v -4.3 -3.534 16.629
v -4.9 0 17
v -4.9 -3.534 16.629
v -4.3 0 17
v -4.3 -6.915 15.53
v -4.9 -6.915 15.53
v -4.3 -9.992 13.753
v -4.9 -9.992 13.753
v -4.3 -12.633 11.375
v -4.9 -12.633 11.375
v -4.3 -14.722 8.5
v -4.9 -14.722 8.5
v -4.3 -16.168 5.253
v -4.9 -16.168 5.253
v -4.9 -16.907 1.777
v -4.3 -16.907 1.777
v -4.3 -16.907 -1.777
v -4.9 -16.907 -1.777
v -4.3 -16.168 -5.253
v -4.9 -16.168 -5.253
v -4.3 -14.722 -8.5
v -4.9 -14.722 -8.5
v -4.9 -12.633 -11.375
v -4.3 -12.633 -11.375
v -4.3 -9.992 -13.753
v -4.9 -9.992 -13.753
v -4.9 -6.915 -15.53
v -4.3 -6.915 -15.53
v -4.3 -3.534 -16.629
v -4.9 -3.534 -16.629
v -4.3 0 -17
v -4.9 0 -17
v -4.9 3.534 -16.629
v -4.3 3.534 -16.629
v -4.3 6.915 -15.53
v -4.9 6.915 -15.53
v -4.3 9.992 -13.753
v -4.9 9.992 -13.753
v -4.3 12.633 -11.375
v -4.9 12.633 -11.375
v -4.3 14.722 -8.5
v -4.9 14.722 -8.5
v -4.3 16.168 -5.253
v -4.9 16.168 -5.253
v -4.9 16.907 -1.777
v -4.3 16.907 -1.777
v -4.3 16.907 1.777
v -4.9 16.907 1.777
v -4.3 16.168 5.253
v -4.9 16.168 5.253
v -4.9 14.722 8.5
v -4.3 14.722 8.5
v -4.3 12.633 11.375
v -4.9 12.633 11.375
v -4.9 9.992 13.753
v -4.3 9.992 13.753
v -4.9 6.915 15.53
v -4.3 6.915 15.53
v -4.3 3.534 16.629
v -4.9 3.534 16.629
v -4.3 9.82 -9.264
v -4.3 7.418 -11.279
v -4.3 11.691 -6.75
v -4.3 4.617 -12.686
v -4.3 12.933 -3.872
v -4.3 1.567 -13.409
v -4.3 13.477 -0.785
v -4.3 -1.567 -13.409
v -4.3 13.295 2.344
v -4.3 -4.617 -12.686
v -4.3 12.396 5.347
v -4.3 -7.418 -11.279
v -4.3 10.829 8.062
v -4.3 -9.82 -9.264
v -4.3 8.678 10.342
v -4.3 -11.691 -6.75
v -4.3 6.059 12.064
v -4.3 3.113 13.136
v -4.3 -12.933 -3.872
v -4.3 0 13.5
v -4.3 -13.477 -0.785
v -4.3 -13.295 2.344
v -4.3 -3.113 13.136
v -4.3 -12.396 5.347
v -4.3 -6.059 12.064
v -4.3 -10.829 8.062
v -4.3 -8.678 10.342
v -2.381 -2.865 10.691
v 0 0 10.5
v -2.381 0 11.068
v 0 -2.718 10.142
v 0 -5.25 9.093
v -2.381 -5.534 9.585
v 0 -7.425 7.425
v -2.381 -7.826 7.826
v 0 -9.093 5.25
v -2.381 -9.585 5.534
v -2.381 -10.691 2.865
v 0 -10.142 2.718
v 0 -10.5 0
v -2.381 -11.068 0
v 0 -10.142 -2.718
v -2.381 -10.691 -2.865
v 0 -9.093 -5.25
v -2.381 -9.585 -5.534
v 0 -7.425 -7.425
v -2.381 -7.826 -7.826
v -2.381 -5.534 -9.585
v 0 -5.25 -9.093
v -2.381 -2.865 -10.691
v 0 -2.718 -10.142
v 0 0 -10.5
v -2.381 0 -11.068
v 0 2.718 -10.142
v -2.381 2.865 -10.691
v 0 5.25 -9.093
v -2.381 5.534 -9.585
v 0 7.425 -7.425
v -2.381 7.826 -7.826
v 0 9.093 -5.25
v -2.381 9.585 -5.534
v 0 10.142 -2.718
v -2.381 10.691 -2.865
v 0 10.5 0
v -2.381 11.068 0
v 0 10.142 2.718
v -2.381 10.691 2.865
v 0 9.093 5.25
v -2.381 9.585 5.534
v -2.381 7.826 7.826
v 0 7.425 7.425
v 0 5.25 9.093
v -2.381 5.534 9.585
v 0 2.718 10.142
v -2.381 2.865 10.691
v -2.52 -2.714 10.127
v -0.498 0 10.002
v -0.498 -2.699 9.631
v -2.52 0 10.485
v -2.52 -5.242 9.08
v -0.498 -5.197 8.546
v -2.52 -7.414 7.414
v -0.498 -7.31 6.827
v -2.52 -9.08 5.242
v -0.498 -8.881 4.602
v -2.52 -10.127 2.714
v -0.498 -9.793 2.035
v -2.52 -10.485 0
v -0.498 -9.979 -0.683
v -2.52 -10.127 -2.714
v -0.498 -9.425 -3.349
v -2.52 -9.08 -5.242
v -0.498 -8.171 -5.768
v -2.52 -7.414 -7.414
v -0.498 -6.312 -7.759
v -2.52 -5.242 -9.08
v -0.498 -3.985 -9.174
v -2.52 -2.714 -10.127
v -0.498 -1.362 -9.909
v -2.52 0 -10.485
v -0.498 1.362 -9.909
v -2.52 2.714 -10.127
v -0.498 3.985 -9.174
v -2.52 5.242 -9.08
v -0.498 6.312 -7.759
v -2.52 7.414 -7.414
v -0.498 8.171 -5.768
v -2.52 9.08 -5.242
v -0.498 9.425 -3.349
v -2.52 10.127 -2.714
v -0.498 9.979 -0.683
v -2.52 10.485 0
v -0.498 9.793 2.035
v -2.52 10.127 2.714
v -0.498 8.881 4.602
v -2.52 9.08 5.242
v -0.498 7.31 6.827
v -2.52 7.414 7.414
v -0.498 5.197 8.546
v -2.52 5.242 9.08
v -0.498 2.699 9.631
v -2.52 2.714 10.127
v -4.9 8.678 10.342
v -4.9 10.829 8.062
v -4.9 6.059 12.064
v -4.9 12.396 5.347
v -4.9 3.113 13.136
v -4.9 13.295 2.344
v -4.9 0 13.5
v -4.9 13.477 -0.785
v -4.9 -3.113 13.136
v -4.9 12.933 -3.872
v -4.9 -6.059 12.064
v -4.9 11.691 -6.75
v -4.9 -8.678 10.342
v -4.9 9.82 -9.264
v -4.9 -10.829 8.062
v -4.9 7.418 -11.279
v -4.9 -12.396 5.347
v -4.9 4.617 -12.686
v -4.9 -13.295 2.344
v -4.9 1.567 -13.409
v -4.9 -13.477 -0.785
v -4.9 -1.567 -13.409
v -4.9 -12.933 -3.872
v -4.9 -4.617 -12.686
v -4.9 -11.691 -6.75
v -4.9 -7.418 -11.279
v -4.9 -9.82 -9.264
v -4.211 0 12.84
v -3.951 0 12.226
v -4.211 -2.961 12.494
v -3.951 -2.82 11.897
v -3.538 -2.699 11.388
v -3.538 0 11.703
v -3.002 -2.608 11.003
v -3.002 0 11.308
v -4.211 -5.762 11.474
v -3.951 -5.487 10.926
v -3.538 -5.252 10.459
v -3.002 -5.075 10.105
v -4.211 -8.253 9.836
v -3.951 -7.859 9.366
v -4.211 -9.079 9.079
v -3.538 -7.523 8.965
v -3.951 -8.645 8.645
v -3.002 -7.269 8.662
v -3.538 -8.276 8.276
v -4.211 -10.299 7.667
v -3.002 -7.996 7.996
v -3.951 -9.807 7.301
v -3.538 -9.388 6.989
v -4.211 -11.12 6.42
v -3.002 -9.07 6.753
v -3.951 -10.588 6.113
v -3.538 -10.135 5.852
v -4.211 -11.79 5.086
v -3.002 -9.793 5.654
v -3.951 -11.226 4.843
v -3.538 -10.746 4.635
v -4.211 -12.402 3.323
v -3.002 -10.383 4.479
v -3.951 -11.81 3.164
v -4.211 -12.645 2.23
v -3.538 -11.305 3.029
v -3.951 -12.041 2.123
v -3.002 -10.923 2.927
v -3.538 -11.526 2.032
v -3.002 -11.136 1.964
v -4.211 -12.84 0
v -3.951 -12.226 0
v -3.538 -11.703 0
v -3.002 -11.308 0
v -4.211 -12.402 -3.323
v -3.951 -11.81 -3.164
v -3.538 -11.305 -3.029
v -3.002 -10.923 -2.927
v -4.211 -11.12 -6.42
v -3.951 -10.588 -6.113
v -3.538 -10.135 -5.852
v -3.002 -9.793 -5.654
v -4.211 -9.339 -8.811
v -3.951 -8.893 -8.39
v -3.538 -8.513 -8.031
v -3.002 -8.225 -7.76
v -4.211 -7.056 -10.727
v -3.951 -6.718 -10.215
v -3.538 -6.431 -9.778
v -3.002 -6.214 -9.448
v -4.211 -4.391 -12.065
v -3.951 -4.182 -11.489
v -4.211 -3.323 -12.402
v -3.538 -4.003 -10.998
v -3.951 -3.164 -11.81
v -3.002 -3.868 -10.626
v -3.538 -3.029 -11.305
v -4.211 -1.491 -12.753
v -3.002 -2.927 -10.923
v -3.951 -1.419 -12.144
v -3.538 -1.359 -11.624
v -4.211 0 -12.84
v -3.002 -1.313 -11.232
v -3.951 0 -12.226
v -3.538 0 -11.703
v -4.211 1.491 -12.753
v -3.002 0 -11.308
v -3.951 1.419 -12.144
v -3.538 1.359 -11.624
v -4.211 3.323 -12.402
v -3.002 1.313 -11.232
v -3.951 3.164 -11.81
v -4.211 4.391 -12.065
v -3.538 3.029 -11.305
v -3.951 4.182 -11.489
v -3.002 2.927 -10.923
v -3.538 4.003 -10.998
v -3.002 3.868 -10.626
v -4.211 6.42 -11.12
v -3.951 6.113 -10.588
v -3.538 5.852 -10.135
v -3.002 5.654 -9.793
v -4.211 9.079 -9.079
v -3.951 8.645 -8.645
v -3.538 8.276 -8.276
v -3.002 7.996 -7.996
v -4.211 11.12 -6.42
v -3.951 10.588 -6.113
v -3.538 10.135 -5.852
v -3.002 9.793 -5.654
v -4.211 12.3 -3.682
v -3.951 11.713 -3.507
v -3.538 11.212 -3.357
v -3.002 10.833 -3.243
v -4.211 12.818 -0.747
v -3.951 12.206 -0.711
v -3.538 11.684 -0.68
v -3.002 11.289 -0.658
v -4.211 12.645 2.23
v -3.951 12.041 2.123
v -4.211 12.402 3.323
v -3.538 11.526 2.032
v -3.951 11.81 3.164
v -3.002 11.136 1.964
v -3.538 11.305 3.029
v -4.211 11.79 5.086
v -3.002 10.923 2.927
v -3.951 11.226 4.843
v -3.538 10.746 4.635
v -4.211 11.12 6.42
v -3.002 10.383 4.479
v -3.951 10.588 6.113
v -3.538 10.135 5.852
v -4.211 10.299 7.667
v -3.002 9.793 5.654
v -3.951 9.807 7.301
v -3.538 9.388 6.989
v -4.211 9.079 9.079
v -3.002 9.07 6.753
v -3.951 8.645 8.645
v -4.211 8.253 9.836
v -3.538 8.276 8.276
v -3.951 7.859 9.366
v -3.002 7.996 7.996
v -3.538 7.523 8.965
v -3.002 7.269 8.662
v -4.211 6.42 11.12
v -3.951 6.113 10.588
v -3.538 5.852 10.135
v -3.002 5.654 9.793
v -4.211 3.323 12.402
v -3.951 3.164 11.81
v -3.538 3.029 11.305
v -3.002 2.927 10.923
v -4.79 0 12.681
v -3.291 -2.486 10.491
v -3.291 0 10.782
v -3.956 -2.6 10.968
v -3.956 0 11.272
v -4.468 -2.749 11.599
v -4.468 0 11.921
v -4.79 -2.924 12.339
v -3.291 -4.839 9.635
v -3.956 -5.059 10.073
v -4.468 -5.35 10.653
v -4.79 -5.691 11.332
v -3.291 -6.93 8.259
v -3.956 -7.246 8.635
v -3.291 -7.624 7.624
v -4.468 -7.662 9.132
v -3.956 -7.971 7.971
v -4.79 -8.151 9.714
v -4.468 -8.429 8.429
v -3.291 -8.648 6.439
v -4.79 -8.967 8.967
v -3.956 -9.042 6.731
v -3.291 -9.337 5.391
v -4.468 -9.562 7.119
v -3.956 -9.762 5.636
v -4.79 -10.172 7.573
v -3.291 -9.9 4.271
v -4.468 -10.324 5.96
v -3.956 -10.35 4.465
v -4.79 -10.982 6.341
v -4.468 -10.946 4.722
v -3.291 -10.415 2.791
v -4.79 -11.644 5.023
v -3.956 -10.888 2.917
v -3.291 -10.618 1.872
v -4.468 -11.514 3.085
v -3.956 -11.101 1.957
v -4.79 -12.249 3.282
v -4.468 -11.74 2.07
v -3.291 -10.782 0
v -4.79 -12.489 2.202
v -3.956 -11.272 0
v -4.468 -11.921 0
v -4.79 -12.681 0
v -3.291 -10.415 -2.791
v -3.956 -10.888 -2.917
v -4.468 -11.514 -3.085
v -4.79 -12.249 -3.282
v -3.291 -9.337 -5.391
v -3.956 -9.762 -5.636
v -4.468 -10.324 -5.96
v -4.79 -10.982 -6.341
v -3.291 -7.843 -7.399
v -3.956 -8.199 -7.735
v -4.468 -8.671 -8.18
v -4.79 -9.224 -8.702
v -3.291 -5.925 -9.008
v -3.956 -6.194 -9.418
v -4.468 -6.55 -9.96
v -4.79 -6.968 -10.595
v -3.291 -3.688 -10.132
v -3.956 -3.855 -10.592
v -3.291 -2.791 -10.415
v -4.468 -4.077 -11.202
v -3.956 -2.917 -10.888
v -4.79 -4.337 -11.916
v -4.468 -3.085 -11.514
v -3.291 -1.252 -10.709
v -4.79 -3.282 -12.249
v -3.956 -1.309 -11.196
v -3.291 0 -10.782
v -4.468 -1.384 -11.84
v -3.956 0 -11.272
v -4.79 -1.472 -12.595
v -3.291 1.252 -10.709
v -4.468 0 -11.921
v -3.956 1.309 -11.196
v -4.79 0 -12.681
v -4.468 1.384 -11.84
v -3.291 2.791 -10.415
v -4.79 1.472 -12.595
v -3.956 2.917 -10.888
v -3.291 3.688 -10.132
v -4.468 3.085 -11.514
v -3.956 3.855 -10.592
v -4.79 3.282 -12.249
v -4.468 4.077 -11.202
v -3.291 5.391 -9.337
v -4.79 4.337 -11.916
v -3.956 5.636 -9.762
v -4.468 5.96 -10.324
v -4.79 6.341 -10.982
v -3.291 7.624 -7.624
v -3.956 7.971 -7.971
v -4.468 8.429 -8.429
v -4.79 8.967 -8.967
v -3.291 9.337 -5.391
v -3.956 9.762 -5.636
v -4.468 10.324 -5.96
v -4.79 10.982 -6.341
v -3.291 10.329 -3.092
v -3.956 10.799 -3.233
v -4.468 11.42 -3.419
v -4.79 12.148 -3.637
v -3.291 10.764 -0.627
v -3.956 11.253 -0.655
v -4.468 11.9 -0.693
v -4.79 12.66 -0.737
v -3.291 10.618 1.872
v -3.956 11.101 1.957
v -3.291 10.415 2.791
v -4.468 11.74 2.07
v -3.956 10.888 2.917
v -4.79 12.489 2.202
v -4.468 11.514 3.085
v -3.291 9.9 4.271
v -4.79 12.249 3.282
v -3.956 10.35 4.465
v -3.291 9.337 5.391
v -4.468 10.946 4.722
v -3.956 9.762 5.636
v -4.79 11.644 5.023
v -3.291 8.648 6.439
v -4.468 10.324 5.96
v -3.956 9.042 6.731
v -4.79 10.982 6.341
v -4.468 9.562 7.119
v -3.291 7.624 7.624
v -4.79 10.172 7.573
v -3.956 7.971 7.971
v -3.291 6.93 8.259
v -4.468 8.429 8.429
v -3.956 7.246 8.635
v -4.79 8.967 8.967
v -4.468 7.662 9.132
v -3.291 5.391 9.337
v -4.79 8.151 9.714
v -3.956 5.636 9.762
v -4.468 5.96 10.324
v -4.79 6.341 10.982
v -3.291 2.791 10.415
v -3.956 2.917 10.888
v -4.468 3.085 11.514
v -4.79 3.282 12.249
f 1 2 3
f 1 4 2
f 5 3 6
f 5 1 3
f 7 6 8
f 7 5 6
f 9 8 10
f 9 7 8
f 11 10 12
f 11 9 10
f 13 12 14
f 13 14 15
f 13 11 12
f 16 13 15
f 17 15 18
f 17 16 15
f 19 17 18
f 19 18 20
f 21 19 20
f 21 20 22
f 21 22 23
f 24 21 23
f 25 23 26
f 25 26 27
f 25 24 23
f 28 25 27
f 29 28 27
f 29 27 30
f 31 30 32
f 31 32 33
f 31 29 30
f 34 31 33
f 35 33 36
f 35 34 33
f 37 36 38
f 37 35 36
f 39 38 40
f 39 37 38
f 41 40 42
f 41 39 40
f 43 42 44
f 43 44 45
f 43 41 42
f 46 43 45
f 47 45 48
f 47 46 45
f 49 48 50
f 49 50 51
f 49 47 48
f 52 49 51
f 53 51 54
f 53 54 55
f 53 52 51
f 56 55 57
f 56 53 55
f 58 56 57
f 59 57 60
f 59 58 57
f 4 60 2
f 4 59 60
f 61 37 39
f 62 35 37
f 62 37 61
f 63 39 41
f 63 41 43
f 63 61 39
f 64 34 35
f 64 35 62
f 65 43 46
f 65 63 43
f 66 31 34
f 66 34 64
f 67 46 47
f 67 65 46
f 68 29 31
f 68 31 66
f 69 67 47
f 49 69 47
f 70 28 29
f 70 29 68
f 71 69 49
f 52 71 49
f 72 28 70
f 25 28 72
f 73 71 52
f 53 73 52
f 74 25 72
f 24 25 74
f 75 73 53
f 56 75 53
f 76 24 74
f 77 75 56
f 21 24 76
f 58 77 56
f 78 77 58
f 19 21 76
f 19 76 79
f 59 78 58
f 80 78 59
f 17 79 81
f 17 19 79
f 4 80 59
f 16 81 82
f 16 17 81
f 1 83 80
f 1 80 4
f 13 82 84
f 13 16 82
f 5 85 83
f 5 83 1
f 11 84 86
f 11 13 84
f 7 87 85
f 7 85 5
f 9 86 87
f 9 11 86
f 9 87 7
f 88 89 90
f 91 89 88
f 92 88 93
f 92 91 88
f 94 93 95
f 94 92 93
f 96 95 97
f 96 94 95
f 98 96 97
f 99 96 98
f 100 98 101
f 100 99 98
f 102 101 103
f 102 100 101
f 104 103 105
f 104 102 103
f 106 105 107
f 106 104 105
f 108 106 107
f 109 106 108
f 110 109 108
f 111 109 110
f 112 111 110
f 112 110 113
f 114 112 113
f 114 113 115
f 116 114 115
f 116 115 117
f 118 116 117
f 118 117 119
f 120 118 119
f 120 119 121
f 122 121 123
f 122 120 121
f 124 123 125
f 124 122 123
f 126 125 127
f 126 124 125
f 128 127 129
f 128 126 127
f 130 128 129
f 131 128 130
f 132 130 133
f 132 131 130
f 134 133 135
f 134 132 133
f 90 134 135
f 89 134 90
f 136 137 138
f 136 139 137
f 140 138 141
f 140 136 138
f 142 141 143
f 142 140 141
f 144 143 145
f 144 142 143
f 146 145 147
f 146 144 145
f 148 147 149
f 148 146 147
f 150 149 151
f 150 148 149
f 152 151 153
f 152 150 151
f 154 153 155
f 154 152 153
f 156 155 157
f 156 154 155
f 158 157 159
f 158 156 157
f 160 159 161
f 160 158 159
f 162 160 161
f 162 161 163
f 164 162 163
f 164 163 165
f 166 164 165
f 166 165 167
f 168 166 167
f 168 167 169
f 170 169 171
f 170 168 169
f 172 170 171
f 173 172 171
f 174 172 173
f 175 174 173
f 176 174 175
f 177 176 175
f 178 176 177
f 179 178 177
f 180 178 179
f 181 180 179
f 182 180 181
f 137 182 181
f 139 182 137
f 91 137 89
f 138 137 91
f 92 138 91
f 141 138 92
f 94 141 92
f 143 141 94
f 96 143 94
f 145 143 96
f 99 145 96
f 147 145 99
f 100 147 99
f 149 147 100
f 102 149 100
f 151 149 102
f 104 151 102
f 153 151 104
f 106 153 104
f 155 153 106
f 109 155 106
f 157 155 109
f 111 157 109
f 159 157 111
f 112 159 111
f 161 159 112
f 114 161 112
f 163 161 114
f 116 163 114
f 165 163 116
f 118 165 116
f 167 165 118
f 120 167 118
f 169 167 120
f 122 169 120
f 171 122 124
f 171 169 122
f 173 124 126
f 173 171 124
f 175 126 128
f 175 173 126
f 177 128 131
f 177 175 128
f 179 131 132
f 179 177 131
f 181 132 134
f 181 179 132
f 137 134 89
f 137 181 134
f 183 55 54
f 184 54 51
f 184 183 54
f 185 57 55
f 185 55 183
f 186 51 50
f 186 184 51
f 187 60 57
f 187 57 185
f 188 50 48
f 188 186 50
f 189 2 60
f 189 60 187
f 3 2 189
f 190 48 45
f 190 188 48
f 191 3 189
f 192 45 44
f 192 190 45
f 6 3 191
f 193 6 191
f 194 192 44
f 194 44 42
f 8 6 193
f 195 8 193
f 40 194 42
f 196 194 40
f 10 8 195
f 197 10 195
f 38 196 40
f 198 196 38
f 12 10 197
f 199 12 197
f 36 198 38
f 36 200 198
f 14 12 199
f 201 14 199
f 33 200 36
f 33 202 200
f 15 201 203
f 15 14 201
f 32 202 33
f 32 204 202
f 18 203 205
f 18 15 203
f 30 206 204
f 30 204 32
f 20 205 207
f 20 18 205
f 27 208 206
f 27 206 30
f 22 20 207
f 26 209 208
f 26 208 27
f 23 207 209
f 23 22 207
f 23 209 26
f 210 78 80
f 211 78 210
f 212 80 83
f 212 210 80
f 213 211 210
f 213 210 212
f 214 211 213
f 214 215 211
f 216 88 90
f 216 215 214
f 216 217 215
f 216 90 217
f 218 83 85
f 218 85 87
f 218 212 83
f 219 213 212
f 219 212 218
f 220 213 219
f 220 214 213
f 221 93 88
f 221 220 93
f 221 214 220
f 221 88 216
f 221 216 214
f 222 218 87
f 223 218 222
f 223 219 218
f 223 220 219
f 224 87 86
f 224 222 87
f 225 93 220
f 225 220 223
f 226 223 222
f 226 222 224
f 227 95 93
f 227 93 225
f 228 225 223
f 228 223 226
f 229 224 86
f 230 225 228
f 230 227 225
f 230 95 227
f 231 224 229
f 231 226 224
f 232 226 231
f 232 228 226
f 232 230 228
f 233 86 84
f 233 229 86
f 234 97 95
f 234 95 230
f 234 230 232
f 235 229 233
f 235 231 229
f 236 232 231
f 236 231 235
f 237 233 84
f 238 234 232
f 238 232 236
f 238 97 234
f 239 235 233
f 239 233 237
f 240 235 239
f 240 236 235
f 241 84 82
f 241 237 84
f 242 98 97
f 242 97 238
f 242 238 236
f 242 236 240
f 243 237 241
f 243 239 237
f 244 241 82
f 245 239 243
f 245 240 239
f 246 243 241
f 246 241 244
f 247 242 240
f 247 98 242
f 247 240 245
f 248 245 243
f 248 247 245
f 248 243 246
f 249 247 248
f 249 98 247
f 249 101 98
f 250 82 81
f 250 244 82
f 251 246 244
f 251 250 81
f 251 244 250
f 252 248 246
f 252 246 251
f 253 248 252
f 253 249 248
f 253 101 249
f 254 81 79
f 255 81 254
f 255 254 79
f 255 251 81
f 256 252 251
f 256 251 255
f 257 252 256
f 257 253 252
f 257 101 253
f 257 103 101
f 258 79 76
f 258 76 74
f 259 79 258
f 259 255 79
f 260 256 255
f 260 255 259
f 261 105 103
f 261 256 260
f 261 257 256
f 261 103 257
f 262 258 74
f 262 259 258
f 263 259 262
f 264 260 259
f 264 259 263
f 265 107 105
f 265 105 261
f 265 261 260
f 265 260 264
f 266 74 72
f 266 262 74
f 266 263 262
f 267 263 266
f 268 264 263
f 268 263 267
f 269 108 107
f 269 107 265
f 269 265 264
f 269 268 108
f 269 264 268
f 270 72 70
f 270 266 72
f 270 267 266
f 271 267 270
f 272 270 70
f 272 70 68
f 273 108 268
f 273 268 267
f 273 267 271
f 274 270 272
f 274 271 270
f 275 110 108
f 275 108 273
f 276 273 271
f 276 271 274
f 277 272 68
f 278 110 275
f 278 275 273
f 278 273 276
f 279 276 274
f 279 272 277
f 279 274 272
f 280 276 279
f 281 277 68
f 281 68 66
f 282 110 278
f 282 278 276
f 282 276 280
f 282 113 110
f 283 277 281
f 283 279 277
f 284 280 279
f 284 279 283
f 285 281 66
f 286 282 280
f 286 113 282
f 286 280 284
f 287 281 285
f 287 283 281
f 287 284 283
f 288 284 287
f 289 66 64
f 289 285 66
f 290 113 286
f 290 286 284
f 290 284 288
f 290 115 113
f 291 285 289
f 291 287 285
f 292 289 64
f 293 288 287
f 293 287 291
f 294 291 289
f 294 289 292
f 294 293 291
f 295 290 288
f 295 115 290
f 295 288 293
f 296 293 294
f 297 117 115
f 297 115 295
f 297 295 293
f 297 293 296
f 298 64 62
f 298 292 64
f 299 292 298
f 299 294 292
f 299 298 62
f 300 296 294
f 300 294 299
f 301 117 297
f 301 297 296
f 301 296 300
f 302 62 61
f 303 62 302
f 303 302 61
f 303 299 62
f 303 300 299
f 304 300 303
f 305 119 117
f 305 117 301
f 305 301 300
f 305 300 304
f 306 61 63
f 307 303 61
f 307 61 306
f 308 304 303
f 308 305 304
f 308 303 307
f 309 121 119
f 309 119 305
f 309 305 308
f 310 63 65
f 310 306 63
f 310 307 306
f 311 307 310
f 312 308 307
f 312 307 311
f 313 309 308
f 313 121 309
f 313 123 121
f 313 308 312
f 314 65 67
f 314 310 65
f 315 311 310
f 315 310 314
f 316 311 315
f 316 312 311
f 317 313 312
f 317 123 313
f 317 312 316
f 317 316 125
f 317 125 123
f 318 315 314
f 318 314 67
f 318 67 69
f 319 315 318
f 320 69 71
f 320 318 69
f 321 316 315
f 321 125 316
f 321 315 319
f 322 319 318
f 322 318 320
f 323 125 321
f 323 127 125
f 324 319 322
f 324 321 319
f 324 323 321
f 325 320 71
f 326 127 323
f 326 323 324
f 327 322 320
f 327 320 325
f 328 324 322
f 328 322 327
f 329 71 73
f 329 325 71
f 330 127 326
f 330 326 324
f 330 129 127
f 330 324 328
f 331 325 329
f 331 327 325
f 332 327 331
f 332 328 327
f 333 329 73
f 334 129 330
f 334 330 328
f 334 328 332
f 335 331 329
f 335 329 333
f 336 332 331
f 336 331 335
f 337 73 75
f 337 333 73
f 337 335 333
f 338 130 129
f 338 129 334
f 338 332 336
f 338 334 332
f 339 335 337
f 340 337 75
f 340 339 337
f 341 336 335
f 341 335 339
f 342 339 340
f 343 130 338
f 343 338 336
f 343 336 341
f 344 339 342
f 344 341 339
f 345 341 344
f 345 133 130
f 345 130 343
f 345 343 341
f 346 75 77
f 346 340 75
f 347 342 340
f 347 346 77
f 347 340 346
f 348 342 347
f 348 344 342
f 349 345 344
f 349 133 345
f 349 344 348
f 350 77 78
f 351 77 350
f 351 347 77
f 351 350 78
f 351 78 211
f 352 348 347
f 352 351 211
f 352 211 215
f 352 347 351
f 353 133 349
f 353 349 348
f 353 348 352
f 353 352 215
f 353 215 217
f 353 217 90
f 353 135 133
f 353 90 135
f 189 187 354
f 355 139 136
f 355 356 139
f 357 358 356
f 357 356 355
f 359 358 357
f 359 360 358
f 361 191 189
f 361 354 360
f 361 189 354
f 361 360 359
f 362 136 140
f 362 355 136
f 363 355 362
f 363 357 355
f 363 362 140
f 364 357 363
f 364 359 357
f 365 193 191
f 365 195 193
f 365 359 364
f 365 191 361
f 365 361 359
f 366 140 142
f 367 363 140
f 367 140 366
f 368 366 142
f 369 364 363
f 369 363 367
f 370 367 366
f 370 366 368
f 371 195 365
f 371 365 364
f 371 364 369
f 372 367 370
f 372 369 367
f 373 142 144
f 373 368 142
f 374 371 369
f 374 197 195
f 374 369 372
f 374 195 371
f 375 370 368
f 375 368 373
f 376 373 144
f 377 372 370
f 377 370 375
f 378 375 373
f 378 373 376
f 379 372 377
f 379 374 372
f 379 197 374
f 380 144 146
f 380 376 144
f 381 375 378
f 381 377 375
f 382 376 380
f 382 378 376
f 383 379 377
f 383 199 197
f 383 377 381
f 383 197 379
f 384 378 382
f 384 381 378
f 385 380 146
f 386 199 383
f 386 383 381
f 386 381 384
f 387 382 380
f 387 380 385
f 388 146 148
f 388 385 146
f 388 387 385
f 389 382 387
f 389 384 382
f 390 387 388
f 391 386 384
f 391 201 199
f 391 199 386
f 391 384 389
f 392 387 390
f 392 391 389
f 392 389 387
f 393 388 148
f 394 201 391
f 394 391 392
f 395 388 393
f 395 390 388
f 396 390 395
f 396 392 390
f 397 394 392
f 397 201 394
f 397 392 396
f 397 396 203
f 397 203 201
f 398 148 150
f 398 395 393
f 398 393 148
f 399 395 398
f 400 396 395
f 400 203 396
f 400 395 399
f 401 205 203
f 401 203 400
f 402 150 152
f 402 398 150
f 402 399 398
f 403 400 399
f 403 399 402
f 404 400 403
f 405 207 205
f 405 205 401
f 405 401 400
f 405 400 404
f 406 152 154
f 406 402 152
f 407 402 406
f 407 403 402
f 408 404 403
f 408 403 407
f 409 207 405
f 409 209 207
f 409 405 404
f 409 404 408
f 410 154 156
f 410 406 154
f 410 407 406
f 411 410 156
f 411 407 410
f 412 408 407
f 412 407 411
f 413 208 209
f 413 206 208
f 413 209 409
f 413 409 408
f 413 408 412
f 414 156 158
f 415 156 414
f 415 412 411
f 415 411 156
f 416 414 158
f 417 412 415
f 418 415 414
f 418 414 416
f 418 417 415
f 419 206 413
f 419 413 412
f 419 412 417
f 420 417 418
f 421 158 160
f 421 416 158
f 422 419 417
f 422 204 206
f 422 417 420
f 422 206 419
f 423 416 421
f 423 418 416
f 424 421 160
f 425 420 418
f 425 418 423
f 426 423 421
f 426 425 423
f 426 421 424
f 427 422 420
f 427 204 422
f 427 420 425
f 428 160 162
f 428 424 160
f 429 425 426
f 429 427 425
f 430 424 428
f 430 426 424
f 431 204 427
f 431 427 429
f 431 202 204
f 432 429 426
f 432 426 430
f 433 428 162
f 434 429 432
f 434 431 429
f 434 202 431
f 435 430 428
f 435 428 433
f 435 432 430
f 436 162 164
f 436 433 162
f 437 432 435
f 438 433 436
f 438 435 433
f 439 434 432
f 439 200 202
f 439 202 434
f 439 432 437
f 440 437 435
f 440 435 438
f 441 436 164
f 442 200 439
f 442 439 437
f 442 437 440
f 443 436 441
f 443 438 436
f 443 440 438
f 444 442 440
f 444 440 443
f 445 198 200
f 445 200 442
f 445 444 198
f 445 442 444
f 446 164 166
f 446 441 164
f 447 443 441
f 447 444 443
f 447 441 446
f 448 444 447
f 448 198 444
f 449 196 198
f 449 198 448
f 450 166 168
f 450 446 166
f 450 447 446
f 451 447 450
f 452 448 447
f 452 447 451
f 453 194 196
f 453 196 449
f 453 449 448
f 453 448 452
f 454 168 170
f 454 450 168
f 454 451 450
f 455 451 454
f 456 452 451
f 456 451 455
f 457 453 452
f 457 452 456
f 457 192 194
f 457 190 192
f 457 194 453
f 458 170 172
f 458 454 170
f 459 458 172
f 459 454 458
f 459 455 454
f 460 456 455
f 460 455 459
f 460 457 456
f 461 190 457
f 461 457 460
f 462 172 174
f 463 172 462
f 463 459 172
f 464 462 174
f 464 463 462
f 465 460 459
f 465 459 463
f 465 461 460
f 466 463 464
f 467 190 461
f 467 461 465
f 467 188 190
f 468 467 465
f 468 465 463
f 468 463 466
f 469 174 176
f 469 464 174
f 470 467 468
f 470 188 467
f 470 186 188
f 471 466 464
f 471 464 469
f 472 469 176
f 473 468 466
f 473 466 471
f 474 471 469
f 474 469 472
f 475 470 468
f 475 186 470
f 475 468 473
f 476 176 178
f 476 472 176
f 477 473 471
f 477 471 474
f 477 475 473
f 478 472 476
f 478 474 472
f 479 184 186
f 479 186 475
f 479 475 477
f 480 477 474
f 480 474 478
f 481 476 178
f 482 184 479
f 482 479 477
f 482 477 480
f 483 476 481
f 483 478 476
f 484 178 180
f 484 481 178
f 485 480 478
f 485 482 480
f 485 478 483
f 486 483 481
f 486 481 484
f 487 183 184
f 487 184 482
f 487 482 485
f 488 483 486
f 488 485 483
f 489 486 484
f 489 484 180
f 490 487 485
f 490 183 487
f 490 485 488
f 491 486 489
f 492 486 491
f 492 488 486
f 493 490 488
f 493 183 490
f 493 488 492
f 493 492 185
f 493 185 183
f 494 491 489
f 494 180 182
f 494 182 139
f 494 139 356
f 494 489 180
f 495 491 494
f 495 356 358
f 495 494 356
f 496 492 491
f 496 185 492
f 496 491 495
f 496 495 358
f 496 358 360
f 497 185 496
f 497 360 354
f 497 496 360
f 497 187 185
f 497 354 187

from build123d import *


with BuildPart() as part:
    # 草图1 → 旋转1 (revolve)
    with BuildSketch(Plane.XY, mode=Mode.PRIVATE) as revolve_1_sk:
        with BuildLine():
            Line((-4.3, 17), (-4.3, 13.5))
            ThreePointArc((-4.3, 13.5), (-3.762314929, 11.951026107), (-2.380543903, 11.068340325))
            Line((-2.380543903, 11.068340325), (0, 10.5))
            Line((0, 10.5), (-0.49797431, 10.00202569))
            Line((-0.49797431, 10.00202569), (-2.51987444, 10.484742003))
            ThreePointArc((-2.51987444, 10.484742003), (-4.233270511, 11.579272373), (-4.9, 13.5))
            Line((-4.9, 13.5), (-4.9, 17))
            Line((-4.9, 17), (-4.3, 17))
        make_face()
    revolve(revolve_1_sk.sketch.rotate(Axis((-48.745596361, 0, 0), (1, 0, 0)), 90), axis=Axis((-48.745596361, 0, 0), (1, 0, 0)))


solid = part.part
